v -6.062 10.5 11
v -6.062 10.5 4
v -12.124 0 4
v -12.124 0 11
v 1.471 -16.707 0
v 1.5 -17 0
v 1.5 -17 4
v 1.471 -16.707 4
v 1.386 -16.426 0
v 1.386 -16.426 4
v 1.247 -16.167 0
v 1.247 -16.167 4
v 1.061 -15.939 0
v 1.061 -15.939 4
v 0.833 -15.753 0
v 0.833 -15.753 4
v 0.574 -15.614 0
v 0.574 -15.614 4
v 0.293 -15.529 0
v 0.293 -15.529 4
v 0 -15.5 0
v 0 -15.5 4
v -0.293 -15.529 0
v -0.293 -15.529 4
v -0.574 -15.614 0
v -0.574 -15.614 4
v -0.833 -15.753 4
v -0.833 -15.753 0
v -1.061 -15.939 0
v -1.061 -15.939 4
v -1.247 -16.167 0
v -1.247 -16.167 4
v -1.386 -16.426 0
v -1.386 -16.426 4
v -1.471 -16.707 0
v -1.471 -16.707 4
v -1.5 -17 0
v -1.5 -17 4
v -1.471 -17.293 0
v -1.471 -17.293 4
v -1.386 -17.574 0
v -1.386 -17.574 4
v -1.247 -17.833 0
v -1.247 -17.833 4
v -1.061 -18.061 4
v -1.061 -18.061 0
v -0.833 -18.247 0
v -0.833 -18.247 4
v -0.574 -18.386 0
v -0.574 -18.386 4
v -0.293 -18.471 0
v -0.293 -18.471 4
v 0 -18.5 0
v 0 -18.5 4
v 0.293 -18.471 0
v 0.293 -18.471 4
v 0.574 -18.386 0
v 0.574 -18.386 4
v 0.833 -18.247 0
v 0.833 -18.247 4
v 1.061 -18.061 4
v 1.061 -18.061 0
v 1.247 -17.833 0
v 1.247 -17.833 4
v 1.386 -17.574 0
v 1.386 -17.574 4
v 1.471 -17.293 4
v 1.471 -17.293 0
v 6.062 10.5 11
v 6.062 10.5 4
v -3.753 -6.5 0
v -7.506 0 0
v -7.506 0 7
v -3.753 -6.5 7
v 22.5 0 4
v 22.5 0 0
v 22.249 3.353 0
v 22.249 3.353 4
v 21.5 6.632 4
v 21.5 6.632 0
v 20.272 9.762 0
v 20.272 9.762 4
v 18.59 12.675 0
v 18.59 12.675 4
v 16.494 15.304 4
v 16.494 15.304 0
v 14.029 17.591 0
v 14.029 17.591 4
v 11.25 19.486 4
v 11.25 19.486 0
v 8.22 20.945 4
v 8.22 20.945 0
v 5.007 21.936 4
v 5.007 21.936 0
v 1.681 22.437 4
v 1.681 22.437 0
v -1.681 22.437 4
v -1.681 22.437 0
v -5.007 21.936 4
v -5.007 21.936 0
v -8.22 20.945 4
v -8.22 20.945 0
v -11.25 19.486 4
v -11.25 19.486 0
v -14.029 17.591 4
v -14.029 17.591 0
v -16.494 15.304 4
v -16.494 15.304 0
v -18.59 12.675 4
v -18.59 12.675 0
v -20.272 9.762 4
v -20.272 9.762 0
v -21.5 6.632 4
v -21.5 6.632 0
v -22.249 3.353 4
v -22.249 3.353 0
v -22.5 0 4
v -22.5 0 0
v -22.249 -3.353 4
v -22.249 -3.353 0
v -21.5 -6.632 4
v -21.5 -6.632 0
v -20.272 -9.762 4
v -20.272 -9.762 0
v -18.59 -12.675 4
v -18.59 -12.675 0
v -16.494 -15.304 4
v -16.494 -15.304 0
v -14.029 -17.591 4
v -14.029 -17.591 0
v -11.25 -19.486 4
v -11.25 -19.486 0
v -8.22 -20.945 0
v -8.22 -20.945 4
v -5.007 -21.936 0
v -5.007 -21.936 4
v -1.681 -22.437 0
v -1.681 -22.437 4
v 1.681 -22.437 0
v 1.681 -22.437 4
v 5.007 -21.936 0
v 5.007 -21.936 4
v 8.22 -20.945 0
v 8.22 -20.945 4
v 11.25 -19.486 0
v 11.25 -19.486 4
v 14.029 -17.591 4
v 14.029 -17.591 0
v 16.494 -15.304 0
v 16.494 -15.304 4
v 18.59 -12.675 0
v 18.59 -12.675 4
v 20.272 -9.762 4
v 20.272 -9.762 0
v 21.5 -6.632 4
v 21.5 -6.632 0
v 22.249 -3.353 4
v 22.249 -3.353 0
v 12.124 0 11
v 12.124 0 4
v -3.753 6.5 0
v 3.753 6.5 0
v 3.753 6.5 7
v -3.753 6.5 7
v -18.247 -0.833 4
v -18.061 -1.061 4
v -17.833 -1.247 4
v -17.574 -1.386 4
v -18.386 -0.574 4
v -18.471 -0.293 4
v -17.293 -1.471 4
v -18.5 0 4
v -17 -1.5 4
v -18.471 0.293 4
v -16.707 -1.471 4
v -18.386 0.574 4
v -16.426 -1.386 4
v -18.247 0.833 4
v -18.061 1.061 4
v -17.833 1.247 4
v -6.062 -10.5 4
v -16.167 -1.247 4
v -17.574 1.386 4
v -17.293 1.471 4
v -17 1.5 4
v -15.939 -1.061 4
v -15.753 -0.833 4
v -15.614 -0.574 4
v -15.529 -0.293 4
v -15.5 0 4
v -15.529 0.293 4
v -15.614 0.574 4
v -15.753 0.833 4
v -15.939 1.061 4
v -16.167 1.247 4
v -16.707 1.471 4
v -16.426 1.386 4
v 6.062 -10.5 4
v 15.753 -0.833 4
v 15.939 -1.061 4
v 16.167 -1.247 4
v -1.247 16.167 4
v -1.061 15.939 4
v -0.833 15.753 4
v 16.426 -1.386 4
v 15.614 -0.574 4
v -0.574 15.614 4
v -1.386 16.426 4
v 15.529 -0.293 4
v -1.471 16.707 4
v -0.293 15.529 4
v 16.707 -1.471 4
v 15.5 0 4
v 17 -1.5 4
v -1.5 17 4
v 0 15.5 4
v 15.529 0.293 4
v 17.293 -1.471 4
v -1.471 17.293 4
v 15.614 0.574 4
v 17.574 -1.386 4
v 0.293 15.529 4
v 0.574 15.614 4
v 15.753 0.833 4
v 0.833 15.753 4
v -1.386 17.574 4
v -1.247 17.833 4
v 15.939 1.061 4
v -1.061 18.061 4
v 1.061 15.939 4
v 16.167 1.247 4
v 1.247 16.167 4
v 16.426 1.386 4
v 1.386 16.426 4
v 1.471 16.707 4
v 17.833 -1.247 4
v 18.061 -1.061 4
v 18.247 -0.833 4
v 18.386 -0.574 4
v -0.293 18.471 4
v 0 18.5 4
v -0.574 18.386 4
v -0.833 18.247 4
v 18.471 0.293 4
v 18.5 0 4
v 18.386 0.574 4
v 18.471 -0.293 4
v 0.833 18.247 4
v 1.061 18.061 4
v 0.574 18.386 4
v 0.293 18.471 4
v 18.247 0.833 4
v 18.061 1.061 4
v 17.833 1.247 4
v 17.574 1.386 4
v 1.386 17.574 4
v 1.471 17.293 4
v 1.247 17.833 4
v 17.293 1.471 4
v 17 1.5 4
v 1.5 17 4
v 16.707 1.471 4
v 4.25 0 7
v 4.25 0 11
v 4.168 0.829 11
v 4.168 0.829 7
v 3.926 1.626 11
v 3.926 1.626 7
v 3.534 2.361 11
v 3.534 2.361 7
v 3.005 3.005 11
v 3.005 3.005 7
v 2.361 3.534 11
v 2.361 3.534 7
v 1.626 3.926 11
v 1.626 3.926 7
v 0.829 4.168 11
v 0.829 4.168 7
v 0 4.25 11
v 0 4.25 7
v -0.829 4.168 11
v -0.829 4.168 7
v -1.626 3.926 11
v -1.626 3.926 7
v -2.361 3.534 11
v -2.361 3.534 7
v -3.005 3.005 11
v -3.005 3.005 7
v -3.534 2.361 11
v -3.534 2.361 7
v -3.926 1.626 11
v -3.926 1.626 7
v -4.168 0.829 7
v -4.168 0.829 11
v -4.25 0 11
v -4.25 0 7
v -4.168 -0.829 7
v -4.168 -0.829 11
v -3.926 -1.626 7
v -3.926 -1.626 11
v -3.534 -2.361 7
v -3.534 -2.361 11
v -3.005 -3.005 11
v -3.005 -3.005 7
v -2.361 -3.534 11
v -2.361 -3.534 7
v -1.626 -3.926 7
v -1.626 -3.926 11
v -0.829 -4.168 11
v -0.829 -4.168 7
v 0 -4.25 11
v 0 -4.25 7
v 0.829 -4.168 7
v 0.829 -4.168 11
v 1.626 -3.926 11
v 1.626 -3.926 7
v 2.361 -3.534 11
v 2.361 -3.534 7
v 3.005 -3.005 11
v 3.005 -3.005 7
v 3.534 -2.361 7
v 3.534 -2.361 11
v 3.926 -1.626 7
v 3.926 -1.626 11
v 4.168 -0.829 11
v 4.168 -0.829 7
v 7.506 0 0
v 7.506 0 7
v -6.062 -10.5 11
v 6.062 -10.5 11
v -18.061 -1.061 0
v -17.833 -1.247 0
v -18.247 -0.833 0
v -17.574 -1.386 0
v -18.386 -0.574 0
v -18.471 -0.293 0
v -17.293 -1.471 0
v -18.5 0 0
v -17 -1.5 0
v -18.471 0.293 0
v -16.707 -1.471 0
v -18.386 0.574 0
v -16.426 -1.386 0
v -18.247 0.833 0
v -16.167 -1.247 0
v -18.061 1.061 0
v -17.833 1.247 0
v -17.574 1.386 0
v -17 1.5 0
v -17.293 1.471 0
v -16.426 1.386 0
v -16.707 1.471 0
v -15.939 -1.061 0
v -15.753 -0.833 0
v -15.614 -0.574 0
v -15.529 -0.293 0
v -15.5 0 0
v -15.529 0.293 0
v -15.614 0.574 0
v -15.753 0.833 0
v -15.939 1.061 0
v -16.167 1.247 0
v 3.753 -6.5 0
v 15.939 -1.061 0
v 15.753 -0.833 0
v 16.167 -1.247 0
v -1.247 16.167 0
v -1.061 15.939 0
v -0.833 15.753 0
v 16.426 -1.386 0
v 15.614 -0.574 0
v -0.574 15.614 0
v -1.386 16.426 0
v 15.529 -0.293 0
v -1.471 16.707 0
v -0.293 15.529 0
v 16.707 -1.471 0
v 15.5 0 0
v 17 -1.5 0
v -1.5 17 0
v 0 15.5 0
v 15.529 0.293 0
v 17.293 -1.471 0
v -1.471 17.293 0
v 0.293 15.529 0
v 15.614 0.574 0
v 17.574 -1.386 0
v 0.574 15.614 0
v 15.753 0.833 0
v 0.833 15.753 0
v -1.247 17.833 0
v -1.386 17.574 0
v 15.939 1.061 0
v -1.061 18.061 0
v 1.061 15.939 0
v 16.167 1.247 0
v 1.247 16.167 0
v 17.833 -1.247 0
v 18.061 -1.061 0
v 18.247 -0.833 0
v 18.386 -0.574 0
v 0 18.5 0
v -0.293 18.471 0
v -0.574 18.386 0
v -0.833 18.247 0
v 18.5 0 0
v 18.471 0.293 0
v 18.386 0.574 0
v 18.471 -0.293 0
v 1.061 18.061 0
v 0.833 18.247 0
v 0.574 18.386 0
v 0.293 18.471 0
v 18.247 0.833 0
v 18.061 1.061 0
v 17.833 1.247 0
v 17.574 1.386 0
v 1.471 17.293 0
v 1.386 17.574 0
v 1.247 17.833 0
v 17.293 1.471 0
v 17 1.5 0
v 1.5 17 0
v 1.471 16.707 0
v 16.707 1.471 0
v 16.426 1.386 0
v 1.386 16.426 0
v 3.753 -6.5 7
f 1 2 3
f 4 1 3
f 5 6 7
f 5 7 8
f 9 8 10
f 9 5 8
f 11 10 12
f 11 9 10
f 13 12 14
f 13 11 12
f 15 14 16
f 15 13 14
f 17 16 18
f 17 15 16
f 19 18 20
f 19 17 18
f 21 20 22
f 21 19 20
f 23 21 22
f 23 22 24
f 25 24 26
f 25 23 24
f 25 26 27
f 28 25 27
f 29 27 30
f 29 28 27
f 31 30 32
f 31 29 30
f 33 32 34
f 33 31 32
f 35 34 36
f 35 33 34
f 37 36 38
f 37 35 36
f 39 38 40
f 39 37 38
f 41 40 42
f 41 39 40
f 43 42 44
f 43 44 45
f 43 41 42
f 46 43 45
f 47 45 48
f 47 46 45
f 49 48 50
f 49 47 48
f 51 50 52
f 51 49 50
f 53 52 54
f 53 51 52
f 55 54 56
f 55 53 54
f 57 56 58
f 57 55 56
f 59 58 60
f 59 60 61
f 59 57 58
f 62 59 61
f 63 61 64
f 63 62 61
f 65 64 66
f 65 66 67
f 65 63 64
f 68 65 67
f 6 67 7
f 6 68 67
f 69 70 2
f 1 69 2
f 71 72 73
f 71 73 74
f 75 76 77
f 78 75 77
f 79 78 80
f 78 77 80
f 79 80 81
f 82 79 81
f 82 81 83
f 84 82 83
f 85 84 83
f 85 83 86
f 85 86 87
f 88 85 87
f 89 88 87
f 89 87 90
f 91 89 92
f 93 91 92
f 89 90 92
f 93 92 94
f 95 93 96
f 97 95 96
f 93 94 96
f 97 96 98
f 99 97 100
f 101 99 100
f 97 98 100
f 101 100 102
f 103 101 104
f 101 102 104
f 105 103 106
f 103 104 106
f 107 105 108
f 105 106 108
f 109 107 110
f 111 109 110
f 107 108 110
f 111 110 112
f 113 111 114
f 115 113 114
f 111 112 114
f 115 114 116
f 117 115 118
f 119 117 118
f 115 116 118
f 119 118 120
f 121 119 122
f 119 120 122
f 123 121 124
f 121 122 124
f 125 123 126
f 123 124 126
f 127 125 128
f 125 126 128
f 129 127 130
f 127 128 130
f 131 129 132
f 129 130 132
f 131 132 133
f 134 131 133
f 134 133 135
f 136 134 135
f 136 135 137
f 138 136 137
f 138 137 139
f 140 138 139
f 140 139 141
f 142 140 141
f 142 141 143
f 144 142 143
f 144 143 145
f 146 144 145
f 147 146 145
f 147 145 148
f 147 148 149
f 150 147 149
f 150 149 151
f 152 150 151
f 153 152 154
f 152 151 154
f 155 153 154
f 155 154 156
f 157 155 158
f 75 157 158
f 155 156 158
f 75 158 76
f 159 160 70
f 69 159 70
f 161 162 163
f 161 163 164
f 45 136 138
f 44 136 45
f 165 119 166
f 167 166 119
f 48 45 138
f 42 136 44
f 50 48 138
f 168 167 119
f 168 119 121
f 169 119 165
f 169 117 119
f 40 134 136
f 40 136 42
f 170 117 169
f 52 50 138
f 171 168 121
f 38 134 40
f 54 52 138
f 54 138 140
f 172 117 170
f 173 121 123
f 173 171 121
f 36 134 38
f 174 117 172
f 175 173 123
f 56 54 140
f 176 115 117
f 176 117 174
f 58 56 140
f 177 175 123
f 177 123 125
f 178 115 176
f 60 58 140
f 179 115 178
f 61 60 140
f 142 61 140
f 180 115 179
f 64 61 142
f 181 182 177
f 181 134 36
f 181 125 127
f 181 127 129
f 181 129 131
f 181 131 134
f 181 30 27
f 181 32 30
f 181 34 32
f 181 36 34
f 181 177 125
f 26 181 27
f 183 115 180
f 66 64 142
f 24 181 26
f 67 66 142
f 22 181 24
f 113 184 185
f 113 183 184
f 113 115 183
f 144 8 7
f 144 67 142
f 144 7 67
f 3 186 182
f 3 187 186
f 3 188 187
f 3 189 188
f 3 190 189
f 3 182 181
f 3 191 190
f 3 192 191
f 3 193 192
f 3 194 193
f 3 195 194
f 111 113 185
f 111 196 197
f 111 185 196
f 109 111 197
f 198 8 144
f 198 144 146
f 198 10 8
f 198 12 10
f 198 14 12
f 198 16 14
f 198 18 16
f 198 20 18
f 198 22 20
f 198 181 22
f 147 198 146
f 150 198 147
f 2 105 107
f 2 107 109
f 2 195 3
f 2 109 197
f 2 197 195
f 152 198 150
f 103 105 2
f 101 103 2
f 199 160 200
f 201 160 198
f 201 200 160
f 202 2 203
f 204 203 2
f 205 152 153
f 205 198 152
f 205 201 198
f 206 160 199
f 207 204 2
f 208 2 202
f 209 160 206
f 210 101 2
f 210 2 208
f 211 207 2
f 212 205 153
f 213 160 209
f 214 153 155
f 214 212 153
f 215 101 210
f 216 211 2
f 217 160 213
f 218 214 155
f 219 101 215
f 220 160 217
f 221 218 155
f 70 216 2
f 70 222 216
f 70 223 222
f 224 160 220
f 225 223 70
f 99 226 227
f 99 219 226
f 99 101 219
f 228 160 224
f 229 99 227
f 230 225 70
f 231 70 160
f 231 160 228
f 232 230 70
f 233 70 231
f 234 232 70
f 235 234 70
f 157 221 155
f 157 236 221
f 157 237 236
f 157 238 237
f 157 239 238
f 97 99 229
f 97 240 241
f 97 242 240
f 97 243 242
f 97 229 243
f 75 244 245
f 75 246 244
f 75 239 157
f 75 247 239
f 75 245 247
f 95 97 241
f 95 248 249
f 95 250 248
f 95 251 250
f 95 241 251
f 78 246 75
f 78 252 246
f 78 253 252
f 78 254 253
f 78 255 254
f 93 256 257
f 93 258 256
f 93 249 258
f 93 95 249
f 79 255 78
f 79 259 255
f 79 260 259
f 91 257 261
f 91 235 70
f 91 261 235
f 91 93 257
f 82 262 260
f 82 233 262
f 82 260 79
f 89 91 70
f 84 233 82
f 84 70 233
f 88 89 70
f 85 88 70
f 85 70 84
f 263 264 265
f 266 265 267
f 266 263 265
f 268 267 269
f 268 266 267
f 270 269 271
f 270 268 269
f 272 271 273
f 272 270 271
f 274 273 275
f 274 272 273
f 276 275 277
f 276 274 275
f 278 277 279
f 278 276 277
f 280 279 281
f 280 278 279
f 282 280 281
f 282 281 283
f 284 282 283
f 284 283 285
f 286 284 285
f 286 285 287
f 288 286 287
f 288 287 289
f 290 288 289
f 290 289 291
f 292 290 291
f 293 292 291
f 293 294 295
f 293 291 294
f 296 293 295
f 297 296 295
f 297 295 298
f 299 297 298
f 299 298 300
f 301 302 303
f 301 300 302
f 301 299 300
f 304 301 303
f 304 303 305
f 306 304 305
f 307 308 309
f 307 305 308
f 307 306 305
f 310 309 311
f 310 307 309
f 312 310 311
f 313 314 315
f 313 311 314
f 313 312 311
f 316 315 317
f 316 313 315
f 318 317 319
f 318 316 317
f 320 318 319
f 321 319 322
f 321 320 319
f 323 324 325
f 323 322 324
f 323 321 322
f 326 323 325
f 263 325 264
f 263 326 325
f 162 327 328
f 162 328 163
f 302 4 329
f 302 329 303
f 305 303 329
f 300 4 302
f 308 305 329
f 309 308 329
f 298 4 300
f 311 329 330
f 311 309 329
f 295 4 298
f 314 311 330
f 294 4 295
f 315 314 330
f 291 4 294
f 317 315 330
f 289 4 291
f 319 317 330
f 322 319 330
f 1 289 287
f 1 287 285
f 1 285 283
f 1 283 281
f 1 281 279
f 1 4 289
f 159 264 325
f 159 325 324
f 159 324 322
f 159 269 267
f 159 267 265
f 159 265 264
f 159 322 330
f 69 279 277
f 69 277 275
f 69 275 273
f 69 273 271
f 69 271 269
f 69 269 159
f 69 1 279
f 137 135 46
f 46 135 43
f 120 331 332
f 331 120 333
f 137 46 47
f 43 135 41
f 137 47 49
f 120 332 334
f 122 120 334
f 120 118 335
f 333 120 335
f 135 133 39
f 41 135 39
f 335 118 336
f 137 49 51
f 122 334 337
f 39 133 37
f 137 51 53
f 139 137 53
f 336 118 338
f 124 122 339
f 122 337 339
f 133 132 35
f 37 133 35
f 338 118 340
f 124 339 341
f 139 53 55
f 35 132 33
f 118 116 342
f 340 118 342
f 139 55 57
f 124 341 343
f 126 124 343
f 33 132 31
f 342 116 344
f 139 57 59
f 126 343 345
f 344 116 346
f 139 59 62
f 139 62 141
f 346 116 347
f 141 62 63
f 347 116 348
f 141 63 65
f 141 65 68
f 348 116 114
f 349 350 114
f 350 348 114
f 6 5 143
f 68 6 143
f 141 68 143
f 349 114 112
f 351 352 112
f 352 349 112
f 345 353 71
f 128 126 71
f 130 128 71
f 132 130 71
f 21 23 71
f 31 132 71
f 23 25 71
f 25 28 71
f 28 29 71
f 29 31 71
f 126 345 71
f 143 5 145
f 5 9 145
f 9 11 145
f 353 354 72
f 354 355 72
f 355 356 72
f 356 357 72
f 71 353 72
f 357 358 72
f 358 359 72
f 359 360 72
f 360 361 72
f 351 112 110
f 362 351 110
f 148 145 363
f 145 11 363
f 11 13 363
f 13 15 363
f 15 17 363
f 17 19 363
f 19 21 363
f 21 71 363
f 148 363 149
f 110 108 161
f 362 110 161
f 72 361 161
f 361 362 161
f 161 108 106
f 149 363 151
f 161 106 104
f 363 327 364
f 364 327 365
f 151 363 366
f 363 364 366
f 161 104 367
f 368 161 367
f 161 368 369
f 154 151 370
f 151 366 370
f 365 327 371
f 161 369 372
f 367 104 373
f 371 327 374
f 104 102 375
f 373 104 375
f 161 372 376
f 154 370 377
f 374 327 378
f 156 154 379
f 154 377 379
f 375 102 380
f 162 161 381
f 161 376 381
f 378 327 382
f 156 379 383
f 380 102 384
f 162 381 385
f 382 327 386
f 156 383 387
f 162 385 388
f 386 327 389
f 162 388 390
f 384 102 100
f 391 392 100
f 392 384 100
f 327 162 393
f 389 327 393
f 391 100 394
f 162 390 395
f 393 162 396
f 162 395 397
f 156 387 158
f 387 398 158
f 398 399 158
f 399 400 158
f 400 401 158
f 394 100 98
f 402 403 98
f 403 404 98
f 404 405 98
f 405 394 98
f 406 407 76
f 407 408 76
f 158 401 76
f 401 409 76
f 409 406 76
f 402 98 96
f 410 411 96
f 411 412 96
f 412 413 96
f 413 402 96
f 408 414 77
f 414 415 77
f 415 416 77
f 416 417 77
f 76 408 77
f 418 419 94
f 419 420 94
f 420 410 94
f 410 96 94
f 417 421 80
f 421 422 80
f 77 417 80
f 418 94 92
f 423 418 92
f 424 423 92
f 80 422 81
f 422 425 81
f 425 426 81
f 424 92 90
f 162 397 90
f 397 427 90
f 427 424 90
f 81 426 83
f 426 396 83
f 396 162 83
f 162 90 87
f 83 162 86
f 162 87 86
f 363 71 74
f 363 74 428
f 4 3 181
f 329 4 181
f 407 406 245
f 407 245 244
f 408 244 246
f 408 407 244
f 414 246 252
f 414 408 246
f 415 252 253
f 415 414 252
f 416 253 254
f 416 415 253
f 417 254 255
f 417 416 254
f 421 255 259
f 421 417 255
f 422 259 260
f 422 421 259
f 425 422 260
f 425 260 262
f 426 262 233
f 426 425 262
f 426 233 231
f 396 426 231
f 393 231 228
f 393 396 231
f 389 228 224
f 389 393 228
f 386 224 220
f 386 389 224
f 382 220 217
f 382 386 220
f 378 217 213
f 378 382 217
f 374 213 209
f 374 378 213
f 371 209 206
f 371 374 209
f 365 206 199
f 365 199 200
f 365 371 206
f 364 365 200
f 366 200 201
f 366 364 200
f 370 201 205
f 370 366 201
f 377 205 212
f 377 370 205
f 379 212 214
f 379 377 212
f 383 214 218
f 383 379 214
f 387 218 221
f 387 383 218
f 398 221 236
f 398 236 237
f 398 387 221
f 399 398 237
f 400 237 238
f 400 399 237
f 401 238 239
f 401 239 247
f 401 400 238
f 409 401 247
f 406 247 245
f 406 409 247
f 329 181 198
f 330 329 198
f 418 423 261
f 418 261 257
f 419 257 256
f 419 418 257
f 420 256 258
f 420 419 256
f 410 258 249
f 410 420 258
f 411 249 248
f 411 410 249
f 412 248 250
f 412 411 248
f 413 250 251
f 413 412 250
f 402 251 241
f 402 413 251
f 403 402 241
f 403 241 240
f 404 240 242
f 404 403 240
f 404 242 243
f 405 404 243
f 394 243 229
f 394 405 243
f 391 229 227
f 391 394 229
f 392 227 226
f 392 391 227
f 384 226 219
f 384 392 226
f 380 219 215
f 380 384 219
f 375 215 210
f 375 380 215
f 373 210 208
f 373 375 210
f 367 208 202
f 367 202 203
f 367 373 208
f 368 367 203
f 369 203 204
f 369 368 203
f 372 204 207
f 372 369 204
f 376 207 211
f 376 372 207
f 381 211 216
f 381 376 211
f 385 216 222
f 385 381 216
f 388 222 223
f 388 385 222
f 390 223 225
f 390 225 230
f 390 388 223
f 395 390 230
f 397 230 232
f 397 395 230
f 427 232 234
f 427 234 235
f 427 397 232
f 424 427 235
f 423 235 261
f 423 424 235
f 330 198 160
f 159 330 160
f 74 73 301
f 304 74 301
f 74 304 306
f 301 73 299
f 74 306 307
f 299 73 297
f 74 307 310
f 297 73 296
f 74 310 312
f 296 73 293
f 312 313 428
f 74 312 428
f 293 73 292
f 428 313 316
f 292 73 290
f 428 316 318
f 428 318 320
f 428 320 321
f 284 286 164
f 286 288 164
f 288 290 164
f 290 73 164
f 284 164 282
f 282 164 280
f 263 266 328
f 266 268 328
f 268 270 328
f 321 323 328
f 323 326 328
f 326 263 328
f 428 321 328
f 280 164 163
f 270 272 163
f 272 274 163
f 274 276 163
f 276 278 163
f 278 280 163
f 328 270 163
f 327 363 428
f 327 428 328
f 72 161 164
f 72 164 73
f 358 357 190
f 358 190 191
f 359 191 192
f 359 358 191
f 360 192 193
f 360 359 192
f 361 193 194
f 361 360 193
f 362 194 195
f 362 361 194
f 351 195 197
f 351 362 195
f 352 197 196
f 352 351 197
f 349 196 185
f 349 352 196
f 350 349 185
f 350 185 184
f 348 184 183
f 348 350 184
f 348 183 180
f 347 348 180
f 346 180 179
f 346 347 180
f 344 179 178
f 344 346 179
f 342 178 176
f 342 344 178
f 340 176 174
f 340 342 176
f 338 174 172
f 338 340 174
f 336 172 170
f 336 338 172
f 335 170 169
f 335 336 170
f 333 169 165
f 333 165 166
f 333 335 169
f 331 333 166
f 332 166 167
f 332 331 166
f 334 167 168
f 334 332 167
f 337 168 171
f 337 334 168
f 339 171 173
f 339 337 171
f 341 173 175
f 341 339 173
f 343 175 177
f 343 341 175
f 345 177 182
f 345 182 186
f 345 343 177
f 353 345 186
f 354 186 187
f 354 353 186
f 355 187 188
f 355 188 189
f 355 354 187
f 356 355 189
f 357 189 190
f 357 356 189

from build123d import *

# Parameters (mm, degrees)
F0_R     = 22.5
F0_R_2   = 1.5
F0_R_3   = 3.75
F1_DEPTH = 4
F0_R_4   = 4.25
F2_DEPTH = 11
F3_DEPTH = 25
F4_DEPTH = 7


with BuildPart() as f1:
    # F0 (on Top) → F1 (new body)
    with BuildSketch(Plane.XY):
        Circle(F0_R)
        with Locations((0, -17)):
            Circle(F0_R_2, mode=Mode.SUBTRACT)
        with Locations((-17, 0)):
            Circle(F0_R_3, mode=Mode.SUBTRACT)
        Polygon((6.062178, -10.5), (-6.062178, -10.5), (-12.124356, 0), (-6.062178, 10.5), (6.062178, 10.5), (12.124356, 0), align=None, mode=Mode.SUBTRACT)
        with Locations((17, 0)):
            Circle(F0_R_2, mode=Mode.SUBTRACT)
        with Locations((0, 17)):
            Circle(F0_R_2, mode=Mode.SUBTRACT)
        with Locations((-17, 0)):
            Circle(F0_R_3)
        with Locations((-17, 0)):
            Circle(F0_R_2, mode=Mode.SUBTRACT)
    extrude(amount=F1_DEPTH)

    # F0 (on Top) → F2 (join)
    with BuildSketch(Plane.XY):
        Polygon((-12.124356, 0), (-6.062178, -10.5), (6.062178, -10.5), (12.124356, 0), (6.062178, 10.5), (-6.062178, 10.5), align=None)
        Polygon((7.505553, 0), (3.752777, -6.5), (-3.752777, -6.5), (-7.505553, 0), (-3.752777, 6.5), (3.752777, 6.5), align=None, mode=Mode.SUBTRACT)
        Polygon((-3.752777, -6.5), (3.752777, -6.5), (7.505553, 0), (3.752777, 6.5), (-3.752777, 6.5), (-7.505553, 0), align=None)
        Circle(F0_R_4, mode=Mode.SUBTRACT)
        Circle(F0_R_4)
    extrude(amount=F2_DEPTH)

    # F0 (on Top) → F3 (cut)
    with BuildSketch(Plane.XY):
        Circle(F0_R_4)
    extrude(amount=F3_DEPTH, mode=Mode.SUBTRACT)

    # F0 (on Top) → F4 (cut)
    with BuildSketch(Plane.XY):
        Polygon((-3.752777, -6.5), (3.752777, -6.5), (7.505553, 0), (3.752777, 6.5), (-3.752777, 6.5), (-7.505553, 0), align=None)
        Circle(F0_R_4, mode=Mode.SUBTRACT)
    extrude(amount=F4_DEPTH, mode=Mode.SUBTRACT)


solid = f1.part
